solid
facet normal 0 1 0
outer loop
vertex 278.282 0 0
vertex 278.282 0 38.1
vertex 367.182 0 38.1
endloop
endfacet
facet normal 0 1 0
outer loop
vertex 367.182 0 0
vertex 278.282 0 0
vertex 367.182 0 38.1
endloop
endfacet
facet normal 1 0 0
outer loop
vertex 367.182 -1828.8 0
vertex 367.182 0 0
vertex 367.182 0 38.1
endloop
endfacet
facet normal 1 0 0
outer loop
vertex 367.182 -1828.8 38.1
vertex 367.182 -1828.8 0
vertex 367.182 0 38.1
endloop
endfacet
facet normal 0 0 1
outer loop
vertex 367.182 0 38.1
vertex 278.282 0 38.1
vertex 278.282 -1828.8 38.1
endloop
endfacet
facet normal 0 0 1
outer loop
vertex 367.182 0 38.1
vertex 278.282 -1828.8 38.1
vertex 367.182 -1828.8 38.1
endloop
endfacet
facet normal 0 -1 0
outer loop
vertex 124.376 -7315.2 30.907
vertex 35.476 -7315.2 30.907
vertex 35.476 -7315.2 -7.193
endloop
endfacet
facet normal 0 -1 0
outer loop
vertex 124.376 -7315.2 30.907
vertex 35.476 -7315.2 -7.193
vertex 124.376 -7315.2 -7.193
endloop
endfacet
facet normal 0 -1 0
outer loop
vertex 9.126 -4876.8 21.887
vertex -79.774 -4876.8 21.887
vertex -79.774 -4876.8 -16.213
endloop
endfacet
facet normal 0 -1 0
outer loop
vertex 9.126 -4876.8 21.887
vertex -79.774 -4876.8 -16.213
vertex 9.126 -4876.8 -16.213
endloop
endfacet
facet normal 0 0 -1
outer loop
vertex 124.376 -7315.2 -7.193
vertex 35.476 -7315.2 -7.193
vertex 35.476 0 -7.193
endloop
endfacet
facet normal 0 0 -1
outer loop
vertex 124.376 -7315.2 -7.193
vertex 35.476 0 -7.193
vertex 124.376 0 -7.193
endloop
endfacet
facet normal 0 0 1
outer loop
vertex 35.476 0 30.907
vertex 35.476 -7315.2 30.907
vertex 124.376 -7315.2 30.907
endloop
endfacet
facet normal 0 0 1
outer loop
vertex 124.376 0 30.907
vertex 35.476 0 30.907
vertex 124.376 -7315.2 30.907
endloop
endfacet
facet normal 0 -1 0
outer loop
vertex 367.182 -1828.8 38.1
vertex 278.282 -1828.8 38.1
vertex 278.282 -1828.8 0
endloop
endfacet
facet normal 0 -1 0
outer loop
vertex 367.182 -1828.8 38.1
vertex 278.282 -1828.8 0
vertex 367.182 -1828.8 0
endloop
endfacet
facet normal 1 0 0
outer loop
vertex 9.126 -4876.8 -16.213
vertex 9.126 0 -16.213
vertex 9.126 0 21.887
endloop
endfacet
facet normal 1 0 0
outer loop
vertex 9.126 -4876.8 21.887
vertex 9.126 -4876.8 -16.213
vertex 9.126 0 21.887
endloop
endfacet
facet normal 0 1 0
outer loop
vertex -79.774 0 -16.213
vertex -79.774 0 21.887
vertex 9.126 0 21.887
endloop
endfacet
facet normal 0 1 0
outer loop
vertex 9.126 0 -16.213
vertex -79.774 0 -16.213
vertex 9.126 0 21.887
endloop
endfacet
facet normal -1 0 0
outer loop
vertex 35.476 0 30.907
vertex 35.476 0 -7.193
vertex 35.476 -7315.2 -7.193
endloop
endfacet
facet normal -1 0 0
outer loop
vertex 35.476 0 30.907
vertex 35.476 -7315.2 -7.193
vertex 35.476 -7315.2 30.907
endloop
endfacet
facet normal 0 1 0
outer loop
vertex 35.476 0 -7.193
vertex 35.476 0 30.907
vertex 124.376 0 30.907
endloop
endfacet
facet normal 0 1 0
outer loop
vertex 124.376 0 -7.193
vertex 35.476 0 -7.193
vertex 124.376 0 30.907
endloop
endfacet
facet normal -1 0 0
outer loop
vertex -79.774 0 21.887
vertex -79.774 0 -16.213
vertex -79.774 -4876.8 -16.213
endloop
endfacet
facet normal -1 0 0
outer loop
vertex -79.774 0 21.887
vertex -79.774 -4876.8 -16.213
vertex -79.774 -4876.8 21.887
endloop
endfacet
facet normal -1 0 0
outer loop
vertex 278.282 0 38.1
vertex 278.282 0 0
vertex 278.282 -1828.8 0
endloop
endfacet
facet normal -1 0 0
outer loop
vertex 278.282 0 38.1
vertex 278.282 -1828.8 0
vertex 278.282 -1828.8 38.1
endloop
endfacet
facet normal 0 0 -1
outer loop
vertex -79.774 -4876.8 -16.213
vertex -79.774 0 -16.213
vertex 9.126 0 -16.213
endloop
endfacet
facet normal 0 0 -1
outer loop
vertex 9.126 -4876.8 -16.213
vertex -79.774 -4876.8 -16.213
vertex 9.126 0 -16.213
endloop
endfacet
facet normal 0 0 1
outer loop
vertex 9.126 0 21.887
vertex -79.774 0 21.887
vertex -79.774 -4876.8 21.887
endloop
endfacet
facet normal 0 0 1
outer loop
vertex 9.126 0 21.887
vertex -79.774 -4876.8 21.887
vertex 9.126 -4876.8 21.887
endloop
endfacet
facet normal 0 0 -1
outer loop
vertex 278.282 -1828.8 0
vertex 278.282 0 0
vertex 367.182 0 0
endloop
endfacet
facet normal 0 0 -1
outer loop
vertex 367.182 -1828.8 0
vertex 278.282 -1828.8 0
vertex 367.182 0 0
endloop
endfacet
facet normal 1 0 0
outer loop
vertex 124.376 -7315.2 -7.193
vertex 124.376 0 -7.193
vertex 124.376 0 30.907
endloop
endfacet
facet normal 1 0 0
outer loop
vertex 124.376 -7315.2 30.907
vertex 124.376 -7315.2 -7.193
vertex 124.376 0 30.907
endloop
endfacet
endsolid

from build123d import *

# Parameters (mm, degrees)
F0_W     = 88.9
F0_H     = 38.1
F1_DEPTH = 4876.8
F2_W     = 88.9
F2_H     = 38.1
F3_DEPTH = 7315.2
F4_R     = 1.5875
F5_DEPTH = 25.4
F6_W     = 88.9
F6_H     = 38.1
F7_DEPTH = 1828.8


with BuildPart() as f1:
    # F0 (on Front) → F1 (new body)
    with BuildSketch(Plane.XZ):
        with Locations((-35.3235648945, 2.8370052017)):
            Rectangle(F0_W, F0_H)
    extrude(amount=F1_DEPTH)

    # F4 (on face) → F5 (cut)
    with BuildSketch(Plane.XY.offset(21.8870052017)):
        with Locations((-16.2735648945, -4851.4)):
            Circle(F4_R)
        with Locations((-54.3735648945, -4851.4)):
            Circle(F4_R)
        with Locations((-54.3735648945, -25.4)):
            Circle(F4_R)
        with Locations((-16.2735648945, -25.4)):
            Circle(F4_R)
    extrude(amount=F5_DEPTH, mode=Mode.SUBTRACT)


with BuildPart() as f3:
    # F2 (on Front) → F3 (new body)
    with BuildSketch(Plane.XZ):
        with Locations((79.9255557358, 11.8567835398)):
            Rectangle(F2_W, F2_H)
    extrude(amount=F3_DEPTH)


with BuildPart() as f7:
    # F6 (on Front) → F7 (new body)
    with BuildSketch(Plane.XZ):
        with Locations((322.7324423572, 19.05)):
            Rectangle(F6_W, F6_H)
    extrude(amount=F7_DEPTH)


solid = Compound([f1.part, f3.part, f7.part])
